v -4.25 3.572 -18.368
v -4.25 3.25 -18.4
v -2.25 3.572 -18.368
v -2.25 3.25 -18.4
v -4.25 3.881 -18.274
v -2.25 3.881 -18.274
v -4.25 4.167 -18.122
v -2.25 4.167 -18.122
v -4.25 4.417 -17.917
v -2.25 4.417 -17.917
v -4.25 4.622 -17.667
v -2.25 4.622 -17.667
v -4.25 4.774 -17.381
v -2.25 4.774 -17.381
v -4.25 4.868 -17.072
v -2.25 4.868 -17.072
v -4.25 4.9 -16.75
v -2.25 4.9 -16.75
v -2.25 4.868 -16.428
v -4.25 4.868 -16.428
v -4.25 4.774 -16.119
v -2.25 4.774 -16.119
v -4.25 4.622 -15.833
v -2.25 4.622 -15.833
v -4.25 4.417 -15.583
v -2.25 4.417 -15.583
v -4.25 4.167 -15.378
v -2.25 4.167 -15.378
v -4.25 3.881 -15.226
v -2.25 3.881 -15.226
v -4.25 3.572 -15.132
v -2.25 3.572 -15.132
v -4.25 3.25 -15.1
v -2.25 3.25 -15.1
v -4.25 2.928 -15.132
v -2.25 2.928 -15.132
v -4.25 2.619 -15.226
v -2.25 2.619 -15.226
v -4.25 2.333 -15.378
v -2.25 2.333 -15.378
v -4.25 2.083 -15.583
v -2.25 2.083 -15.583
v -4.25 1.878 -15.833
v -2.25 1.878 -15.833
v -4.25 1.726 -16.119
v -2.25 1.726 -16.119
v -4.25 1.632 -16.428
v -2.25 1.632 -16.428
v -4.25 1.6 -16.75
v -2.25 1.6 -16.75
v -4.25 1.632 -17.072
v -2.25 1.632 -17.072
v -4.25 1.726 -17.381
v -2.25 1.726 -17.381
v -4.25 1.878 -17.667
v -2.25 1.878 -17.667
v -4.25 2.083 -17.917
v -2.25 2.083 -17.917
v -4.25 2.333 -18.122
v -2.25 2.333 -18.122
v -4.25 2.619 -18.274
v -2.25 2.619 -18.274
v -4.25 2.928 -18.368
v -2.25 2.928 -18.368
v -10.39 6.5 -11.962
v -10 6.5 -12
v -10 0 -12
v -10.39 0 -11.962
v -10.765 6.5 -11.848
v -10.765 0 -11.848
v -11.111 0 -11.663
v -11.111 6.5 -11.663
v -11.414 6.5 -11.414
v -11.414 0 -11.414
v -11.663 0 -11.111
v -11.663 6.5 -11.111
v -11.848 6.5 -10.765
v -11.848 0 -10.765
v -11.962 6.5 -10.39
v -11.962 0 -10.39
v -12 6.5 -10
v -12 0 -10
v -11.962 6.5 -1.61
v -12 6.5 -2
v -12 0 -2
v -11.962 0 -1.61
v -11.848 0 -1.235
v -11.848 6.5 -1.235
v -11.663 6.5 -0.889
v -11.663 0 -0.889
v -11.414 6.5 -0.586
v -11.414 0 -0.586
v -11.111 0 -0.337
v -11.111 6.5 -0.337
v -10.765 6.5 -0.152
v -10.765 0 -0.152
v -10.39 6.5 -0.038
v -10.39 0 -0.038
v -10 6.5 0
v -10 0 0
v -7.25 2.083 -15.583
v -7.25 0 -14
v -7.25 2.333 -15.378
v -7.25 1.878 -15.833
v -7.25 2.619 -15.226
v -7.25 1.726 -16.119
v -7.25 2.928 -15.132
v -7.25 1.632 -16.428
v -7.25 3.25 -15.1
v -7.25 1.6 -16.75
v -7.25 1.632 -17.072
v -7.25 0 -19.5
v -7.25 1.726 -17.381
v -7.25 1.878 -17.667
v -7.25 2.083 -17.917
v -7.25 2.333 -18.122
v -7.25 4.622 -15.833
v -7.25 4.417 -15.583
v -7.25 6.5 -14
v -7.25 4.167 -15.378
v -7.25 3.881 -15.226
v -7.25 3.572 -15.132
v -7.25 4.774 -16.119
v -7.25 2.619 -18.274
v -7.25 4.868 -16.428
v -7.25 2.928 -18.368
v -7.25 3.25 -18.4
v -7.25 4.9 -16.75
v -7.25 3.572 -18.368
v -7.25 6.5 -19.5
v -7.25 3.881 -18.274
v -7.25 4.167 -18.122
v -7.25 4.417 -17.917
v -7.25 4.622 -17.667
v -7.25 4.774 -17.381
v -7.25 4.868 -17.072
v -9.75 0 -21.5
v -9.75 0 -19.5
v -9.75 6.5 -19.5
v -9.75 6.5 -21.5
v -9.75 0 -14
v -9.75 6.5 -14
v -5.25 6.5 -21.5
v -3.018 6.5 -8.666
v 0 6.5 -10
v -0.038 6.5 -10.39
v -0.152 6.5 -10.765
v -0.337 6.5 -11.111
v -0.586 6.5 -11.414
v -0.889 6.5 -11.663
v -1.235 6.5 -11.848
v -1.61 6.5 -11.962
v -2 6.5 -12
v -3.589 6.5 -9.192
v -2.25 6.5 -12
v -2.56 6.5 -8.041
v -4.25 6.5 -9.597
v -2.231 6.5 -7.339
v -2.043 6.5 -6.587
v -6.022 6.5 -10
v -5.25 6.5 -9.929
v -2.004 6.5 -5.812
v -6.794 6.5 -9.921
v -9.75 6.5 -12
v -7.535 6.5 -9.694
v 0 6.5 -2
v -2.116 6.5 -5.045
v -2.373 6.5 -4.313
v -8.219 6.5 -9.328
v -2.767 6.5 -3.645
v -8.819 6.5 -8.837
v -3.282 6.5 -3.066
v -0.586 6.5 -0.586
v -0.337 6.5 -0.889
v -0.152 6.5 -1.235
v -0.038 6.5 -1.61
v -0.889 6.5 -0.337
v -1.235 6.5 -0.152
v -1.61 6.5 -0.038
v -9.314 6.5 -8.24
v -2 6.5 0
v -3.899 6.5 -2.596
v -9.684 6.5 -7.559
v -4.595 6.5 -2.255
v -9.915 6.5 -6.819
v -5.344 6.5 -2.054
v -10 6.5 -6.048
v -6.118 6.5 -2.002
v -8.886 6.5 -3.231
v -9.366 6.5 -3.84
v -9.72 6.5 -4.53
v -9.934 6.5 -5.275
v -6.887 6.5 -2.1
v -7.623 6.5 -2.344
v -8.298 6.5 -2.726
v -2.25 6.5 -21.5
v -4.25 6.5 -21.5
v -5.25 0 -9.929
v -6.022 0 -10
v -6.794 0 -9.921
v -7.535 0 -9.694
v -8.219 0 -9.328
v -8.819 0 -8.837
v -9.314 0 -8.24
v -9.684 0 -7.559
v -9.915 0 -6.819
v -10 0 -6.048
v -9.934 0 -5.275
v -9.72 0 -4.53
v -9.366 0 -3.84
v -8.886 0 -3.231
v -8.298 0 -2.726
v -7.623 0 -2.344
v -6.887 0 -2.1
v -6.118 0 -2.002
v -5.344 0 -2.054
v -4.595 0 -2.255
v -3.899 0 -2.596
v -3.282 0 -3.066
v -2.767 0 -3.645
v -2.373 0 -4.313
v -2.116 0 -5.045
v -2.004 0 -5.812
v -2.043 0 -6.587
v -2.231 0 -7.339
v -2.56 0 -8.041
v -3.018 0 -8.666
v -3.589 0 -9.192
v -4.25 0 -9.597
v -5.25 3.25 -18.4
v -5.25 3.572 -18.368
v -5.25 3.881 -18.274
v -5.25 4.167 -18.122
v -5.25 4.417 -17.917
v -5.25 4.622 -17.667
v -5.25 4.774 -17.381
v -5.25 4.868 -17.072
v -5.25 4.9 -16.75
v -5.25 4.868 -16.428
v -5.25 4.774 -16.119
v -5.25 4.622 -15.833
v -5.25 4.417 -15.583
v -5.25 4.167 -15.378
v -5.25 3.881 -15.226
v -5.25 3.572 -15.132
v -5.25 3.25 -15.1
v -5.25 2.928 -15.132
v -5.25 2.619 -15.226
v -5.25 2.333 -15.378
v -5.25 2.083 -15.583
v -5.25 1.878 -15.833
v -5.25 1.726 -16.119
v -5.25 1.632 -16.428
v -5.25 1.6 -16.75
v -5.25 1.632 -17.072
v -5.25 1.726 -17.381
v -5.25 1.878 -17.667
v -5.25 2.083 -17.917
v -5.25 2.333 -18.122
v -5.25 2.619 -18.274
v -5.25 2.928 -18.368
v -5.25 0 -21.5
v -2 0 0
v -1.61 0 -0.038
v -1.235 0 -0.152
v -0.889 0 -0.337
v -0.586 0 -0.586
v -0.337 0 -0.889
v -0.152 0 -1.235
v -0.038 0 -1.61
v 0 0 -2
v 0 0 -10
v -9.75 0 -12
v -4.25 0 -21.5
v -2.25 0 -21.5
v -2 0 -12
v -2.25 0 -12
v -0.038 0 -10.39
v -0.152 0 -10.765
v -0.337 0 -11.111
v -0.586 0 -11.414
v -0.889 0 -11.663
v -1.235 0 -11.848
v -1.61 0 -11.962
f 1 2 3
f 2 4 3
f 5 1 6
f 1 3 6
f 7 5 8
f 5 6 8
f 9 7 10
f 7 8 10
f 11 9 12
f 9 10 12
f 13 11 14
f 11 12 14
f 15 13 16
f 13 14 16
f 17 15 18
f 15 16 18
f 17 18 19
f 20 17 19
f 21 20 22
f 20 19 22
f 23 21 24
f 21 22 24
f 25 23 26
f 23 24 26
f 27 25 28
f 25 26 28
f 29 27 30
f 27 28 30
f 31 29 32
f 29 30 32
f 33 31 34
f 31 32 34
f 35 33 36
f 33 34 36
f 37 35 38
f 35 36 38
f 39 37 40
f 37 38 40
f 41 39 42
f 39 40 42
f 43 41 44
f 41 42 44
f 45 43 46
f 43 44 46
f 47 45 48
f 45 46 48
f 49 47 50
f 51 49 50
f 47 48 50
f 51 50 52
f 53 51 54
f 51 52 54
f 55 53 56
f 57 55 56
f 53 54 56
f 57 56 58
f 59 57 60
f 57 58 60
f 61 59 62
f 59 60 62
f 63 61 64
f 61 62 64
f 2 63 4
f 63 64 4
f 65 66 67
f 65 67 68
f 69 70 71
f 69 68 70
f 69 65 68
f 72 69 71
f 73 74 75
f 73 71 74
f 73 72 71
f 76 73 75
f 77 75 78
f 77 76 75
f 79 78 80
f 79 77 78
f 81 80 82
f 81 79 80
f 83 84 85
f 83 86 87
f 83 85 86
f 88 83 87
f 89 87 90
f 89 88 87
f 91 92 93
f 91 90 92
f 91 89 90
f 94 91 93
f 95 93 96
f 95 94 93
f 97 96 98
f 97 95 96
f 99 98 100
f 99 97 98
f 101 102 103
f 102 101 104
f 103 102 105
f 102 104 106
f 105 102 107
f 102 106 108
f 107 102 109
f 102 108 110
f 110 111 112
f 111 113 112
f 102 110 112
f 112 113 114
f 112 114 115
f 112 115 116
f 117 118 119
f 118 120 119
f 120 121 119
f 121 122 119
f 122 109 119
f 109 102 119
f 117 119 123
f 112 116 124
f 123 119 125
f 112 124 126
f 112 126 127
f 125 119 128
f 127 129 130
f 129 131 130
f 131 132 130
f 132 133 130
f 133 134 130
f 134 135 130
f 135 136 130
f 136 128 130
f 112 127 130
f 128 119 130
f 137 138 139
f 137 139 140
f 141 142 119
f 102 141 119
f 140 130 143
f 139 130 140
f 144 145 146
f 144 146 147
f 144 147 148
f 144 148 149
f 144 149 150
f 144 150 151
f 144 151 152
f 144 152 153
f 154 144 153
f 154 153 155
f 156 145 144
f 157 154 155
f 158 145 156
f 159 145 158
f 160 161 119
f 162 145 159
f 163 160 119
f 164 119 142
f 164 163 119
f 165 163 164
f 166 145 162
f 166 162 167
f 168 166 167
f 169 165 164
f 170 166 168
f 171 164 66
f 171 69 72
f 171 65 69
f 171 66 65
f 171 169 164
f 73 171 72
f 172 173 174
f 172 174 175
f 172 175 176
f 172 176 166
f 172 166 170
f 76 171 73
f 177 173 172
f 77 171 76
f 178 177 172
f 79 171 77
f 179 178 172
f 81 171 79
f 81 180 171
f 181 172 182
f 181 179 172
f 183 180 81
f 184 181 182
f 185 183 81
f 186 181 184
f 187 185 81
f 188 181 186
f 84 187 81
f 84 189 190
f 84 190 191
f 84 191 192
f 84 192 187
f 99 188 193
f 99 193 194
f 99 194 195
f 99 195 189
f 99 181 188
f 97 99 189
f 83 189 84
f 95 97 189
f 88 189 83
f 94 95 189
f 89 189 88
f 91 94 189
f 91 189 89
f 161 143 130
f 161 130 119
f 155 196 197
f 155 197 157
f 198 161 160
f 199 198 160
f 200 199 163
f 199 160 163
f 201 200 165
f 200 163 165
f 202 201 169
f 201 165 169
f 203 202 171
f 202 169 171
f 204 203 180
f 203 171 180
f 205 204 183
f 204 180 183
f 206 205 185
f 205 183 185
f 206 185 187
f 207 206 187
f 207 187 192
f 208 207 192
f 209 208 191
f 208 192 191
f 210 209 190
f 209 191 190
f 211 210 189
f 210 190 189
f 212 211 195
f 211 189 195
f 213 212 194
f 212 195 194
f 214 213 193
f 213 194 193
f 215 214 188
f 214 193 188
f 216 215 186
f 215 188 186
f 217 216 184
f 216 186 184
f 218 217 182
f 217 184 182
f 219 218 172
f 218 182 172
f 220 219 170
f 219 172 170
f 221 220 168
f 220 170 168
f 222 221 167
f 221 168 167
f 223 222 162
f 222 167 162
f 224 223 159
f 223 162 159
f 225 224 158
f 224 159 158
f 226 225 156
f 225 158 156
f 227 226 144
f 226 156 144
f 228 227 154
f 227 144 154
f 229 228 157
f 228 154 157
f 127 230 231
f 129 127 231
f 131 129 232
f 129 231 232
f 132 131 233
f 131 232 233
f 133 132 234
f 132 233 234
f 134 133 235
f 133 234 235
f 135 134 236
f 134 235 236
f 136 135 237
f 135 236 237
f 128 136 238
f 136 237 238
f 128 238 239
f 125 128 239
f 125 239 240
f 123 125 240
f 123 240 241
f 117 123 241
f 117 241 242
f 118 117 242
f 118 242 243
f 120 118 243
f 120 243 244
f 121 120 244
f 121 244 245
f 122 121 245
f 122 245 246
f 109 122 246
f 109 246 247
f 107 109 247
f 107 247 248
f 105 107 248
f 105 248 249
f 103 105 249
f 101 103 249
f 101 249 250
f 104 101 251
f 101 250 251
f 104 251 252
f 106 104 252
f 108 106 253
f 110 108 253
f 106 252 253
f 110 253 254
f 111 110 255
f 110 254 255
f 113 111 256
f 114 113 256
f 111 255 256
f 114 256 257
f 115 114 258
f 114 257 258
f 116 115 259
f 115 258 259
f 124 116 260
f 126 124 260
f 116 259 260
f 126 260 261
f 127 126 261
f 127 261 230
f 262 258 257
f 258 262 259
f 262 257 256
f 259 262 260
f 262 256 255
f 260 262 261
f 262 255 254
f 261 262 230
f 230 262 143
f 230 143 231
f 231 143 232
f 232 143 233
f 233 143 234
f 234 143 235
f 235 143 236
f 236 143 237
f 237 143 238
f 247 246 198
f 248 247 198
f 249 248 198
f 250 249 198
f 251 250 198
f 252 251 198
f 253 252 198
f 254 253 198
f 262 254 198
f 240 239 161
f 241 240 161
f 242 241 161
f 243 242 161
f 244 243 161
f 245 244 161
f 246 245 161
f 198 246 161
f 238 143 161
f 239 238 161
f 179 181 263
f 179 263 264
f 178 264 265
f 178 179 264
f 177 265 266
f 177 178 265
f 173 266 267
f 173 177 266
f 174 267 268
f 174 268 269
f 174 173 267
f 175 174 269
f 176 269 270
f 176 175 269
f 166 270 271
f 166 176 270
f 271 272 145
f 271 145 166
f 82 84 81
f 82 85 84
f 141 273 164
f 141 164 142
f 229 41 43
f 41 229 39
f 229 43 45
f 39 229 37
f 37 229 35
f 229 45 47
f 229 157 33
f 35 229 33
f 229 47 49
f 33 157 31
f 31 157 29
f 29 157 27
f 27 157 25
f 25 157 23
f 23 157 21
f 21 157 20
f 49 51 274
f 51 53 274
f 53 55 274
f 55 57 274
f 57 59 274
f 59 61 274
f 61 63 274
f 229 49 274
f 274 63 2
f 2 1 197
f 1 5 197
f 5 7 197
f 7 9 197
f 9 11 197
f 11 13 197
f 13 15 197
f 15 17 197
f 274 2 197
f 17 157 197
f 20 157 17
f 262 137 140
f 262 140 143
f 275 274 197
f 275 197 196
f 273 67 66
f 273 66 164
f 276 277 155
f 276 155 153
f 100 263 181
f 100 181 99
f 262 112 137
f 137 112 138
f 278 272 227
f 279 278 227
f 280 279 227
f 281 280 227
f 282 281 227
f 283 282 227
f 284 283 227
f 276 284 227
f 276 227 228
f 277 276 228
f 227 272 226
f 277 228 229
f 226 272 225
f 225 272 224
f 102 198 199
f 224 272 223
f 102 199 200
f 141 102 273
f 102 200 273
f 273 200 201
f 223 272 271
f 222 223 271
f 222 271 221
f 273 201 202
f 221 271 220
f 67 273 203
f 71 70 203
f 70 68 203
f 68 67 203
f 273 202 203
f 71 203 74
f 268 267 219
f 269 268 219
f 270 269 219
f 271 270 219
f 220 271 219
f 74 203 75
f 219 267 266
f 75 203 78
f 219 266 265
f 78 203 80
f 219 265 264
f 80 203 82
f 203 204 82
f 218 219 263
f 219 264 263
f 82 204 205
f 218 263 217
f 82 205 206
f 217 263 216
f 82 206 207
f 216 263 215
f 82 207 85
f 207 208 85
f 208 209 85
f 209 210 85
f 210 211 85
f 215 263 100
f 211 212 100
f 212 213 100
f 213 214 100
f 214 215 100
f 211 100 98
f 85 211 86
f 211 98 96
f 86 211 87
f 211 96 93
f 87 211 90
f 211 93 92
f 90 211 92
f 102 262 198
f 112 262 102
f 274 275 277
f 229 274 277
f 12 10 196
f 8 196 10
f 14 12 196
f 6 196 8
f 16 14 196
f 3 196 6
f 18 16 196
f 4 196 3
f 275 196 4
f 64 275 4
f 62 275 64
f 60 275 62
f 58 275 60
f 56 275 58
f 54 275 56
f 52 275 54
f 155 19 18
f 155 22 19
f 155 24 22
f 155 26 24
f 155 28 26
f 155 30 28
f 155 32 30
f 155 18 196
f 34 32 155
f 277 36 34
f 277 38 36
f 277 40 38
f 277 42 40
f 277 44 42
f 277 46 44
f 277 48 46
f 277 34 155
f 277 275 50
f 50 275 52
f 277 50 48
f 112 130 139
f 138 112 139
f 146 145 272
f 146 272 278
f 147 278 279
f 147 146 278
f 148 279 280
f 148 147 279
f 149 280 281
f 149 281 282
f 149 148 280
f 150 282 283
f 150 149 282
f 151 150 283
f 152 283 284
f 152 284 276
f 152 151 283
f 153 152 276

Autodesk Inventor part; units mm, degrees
ref_plane "YZ Plane" through (0, 0, 0) normal (1, 0, 0) x (0, 1, 0)
ref_plane "XZ Plane" through (0, 0, 0) normal (0, 1, 0) x (-1, 0, 0)
ref_plane "XY Plane" through (0, 0, 0) normal (0, 0, 1) x (1, 0, 0)
sketch "Sketch4" plane through (0, 0, 0) normal (0, 1, 0) x (-1, 0, 0)
  line L0 (0, 0) -> (12, 0)
  line L1 (12, 0) -> (12, -12)
  line L2 (12, -12) -> (9.75, -12)
  line L3 (9.75, -12) -> (9.75, -21.5)
  line L4 (9.75, -21.5) -> (2.25, -21.5)
  line L5 (2.25, -21.5) -> (2.25, -12)
  line L6 (2.25, -12) -> (0, -12)
  line L7 (0, -12) -> (0, 0)
  dimension "d17" = 12
  dimension "d18" = 12
  dimension "d19" = 7.5
  dimension "d20" = 2.25
  dimension "d21" = 9.5
extrude "Extrusion2" add sketch "Sketch4" along normal blind 6.5
sketch "Sketch5" plane through (0, 6.5, 0) normal (0, 1, 0) x (1, 0, 0)
  line L0 (-9.75, 14) -> (-7.25, 14)
  line L1 (-7.25, 14) -> (-7.25, 19.5)
  line L2 (-7.25, 19.5) -> (-9.75, 19.5)
  line L3 (-9.75, 19.5) -> (-9.75, 14)
  line L4 (-2.25, 21.5) -> (-9.75, 21.5) projected
  line L5 (-9.75, 21.5) -> (-9.75, 12) projected
  point P0 (0, 0)
  dimension "d24" = 5.5
  dimension "d25" = 2.5
  dimension "d26" = 2
extrude "Extrusion3" cut sketch "Sketch5" against normal through all
sketch "Sketch6" plane through (0, 6.5, 0) normal (0, 1, 0) x (1, 0, 0)
  circle A0 centre (-6, 6) radius 4
  line L0 (-12, 0) -> (0, 0) projected
  line L1 (0, 0) -> (0, 12) projected
  dimension "d29" = 8
  dimension "d30" = 6
  dimension "d31" = 6
extrude "Extrusion4" cut sketch "Sketch6" against normal through all
sketch "Sketch7" plane through (0, 6.5, 0) normal (0, 1, 0) x (1, 0, 0)
  line L0 (-5.25, 8.5) -> (-4.25, 8.5)
  line L1 (-4.25, 8.5) -> (-4.25, 21.5)
  line L2 (-4.25, 21.5) -> (-5.25, 21.5)
  line L3 (-5.25, 21.5) -> (-5.25, 8.5)
  line L4 (-2.25, 21.5) -> (-9.75, 21.5) projected
  line L5 (-2.25, 12) -> (-2.25, 21.5) projected
  point P0 (0, 0)
  dimension "d34" = 1
  dimension "d35" = 13
  dimension "d36" = 2
extrude "Extrusion5" cut sketch "Sketch7" against normal through all
sketch "Sketch8" plane through (-2.25, 0, -12) normal (1, 0, 0) x (0, 0, -1)
  circle A0 centre (4.75, 3.25) radius 1.65
  line L0 (0, 0) -> (9.5, 0) projected
  line L1 (9.5, 0) -> (9.5, 6.5) projected
  point P0 (-12, 0)
  dimension "d39" = 3.3
  dimension "d40" = 3.25
  dimension "d41" = 4.75
extrude "Extrusion6" cut sketch "Sketch8" against normal through all
fillet "Fillet1" radius 2 4 edges at (-12, 3.25, -12) (-12, 3.25, 0) (0, 3.25, 0) (0, 3.25, -12)
properties part number "COLLIER"
